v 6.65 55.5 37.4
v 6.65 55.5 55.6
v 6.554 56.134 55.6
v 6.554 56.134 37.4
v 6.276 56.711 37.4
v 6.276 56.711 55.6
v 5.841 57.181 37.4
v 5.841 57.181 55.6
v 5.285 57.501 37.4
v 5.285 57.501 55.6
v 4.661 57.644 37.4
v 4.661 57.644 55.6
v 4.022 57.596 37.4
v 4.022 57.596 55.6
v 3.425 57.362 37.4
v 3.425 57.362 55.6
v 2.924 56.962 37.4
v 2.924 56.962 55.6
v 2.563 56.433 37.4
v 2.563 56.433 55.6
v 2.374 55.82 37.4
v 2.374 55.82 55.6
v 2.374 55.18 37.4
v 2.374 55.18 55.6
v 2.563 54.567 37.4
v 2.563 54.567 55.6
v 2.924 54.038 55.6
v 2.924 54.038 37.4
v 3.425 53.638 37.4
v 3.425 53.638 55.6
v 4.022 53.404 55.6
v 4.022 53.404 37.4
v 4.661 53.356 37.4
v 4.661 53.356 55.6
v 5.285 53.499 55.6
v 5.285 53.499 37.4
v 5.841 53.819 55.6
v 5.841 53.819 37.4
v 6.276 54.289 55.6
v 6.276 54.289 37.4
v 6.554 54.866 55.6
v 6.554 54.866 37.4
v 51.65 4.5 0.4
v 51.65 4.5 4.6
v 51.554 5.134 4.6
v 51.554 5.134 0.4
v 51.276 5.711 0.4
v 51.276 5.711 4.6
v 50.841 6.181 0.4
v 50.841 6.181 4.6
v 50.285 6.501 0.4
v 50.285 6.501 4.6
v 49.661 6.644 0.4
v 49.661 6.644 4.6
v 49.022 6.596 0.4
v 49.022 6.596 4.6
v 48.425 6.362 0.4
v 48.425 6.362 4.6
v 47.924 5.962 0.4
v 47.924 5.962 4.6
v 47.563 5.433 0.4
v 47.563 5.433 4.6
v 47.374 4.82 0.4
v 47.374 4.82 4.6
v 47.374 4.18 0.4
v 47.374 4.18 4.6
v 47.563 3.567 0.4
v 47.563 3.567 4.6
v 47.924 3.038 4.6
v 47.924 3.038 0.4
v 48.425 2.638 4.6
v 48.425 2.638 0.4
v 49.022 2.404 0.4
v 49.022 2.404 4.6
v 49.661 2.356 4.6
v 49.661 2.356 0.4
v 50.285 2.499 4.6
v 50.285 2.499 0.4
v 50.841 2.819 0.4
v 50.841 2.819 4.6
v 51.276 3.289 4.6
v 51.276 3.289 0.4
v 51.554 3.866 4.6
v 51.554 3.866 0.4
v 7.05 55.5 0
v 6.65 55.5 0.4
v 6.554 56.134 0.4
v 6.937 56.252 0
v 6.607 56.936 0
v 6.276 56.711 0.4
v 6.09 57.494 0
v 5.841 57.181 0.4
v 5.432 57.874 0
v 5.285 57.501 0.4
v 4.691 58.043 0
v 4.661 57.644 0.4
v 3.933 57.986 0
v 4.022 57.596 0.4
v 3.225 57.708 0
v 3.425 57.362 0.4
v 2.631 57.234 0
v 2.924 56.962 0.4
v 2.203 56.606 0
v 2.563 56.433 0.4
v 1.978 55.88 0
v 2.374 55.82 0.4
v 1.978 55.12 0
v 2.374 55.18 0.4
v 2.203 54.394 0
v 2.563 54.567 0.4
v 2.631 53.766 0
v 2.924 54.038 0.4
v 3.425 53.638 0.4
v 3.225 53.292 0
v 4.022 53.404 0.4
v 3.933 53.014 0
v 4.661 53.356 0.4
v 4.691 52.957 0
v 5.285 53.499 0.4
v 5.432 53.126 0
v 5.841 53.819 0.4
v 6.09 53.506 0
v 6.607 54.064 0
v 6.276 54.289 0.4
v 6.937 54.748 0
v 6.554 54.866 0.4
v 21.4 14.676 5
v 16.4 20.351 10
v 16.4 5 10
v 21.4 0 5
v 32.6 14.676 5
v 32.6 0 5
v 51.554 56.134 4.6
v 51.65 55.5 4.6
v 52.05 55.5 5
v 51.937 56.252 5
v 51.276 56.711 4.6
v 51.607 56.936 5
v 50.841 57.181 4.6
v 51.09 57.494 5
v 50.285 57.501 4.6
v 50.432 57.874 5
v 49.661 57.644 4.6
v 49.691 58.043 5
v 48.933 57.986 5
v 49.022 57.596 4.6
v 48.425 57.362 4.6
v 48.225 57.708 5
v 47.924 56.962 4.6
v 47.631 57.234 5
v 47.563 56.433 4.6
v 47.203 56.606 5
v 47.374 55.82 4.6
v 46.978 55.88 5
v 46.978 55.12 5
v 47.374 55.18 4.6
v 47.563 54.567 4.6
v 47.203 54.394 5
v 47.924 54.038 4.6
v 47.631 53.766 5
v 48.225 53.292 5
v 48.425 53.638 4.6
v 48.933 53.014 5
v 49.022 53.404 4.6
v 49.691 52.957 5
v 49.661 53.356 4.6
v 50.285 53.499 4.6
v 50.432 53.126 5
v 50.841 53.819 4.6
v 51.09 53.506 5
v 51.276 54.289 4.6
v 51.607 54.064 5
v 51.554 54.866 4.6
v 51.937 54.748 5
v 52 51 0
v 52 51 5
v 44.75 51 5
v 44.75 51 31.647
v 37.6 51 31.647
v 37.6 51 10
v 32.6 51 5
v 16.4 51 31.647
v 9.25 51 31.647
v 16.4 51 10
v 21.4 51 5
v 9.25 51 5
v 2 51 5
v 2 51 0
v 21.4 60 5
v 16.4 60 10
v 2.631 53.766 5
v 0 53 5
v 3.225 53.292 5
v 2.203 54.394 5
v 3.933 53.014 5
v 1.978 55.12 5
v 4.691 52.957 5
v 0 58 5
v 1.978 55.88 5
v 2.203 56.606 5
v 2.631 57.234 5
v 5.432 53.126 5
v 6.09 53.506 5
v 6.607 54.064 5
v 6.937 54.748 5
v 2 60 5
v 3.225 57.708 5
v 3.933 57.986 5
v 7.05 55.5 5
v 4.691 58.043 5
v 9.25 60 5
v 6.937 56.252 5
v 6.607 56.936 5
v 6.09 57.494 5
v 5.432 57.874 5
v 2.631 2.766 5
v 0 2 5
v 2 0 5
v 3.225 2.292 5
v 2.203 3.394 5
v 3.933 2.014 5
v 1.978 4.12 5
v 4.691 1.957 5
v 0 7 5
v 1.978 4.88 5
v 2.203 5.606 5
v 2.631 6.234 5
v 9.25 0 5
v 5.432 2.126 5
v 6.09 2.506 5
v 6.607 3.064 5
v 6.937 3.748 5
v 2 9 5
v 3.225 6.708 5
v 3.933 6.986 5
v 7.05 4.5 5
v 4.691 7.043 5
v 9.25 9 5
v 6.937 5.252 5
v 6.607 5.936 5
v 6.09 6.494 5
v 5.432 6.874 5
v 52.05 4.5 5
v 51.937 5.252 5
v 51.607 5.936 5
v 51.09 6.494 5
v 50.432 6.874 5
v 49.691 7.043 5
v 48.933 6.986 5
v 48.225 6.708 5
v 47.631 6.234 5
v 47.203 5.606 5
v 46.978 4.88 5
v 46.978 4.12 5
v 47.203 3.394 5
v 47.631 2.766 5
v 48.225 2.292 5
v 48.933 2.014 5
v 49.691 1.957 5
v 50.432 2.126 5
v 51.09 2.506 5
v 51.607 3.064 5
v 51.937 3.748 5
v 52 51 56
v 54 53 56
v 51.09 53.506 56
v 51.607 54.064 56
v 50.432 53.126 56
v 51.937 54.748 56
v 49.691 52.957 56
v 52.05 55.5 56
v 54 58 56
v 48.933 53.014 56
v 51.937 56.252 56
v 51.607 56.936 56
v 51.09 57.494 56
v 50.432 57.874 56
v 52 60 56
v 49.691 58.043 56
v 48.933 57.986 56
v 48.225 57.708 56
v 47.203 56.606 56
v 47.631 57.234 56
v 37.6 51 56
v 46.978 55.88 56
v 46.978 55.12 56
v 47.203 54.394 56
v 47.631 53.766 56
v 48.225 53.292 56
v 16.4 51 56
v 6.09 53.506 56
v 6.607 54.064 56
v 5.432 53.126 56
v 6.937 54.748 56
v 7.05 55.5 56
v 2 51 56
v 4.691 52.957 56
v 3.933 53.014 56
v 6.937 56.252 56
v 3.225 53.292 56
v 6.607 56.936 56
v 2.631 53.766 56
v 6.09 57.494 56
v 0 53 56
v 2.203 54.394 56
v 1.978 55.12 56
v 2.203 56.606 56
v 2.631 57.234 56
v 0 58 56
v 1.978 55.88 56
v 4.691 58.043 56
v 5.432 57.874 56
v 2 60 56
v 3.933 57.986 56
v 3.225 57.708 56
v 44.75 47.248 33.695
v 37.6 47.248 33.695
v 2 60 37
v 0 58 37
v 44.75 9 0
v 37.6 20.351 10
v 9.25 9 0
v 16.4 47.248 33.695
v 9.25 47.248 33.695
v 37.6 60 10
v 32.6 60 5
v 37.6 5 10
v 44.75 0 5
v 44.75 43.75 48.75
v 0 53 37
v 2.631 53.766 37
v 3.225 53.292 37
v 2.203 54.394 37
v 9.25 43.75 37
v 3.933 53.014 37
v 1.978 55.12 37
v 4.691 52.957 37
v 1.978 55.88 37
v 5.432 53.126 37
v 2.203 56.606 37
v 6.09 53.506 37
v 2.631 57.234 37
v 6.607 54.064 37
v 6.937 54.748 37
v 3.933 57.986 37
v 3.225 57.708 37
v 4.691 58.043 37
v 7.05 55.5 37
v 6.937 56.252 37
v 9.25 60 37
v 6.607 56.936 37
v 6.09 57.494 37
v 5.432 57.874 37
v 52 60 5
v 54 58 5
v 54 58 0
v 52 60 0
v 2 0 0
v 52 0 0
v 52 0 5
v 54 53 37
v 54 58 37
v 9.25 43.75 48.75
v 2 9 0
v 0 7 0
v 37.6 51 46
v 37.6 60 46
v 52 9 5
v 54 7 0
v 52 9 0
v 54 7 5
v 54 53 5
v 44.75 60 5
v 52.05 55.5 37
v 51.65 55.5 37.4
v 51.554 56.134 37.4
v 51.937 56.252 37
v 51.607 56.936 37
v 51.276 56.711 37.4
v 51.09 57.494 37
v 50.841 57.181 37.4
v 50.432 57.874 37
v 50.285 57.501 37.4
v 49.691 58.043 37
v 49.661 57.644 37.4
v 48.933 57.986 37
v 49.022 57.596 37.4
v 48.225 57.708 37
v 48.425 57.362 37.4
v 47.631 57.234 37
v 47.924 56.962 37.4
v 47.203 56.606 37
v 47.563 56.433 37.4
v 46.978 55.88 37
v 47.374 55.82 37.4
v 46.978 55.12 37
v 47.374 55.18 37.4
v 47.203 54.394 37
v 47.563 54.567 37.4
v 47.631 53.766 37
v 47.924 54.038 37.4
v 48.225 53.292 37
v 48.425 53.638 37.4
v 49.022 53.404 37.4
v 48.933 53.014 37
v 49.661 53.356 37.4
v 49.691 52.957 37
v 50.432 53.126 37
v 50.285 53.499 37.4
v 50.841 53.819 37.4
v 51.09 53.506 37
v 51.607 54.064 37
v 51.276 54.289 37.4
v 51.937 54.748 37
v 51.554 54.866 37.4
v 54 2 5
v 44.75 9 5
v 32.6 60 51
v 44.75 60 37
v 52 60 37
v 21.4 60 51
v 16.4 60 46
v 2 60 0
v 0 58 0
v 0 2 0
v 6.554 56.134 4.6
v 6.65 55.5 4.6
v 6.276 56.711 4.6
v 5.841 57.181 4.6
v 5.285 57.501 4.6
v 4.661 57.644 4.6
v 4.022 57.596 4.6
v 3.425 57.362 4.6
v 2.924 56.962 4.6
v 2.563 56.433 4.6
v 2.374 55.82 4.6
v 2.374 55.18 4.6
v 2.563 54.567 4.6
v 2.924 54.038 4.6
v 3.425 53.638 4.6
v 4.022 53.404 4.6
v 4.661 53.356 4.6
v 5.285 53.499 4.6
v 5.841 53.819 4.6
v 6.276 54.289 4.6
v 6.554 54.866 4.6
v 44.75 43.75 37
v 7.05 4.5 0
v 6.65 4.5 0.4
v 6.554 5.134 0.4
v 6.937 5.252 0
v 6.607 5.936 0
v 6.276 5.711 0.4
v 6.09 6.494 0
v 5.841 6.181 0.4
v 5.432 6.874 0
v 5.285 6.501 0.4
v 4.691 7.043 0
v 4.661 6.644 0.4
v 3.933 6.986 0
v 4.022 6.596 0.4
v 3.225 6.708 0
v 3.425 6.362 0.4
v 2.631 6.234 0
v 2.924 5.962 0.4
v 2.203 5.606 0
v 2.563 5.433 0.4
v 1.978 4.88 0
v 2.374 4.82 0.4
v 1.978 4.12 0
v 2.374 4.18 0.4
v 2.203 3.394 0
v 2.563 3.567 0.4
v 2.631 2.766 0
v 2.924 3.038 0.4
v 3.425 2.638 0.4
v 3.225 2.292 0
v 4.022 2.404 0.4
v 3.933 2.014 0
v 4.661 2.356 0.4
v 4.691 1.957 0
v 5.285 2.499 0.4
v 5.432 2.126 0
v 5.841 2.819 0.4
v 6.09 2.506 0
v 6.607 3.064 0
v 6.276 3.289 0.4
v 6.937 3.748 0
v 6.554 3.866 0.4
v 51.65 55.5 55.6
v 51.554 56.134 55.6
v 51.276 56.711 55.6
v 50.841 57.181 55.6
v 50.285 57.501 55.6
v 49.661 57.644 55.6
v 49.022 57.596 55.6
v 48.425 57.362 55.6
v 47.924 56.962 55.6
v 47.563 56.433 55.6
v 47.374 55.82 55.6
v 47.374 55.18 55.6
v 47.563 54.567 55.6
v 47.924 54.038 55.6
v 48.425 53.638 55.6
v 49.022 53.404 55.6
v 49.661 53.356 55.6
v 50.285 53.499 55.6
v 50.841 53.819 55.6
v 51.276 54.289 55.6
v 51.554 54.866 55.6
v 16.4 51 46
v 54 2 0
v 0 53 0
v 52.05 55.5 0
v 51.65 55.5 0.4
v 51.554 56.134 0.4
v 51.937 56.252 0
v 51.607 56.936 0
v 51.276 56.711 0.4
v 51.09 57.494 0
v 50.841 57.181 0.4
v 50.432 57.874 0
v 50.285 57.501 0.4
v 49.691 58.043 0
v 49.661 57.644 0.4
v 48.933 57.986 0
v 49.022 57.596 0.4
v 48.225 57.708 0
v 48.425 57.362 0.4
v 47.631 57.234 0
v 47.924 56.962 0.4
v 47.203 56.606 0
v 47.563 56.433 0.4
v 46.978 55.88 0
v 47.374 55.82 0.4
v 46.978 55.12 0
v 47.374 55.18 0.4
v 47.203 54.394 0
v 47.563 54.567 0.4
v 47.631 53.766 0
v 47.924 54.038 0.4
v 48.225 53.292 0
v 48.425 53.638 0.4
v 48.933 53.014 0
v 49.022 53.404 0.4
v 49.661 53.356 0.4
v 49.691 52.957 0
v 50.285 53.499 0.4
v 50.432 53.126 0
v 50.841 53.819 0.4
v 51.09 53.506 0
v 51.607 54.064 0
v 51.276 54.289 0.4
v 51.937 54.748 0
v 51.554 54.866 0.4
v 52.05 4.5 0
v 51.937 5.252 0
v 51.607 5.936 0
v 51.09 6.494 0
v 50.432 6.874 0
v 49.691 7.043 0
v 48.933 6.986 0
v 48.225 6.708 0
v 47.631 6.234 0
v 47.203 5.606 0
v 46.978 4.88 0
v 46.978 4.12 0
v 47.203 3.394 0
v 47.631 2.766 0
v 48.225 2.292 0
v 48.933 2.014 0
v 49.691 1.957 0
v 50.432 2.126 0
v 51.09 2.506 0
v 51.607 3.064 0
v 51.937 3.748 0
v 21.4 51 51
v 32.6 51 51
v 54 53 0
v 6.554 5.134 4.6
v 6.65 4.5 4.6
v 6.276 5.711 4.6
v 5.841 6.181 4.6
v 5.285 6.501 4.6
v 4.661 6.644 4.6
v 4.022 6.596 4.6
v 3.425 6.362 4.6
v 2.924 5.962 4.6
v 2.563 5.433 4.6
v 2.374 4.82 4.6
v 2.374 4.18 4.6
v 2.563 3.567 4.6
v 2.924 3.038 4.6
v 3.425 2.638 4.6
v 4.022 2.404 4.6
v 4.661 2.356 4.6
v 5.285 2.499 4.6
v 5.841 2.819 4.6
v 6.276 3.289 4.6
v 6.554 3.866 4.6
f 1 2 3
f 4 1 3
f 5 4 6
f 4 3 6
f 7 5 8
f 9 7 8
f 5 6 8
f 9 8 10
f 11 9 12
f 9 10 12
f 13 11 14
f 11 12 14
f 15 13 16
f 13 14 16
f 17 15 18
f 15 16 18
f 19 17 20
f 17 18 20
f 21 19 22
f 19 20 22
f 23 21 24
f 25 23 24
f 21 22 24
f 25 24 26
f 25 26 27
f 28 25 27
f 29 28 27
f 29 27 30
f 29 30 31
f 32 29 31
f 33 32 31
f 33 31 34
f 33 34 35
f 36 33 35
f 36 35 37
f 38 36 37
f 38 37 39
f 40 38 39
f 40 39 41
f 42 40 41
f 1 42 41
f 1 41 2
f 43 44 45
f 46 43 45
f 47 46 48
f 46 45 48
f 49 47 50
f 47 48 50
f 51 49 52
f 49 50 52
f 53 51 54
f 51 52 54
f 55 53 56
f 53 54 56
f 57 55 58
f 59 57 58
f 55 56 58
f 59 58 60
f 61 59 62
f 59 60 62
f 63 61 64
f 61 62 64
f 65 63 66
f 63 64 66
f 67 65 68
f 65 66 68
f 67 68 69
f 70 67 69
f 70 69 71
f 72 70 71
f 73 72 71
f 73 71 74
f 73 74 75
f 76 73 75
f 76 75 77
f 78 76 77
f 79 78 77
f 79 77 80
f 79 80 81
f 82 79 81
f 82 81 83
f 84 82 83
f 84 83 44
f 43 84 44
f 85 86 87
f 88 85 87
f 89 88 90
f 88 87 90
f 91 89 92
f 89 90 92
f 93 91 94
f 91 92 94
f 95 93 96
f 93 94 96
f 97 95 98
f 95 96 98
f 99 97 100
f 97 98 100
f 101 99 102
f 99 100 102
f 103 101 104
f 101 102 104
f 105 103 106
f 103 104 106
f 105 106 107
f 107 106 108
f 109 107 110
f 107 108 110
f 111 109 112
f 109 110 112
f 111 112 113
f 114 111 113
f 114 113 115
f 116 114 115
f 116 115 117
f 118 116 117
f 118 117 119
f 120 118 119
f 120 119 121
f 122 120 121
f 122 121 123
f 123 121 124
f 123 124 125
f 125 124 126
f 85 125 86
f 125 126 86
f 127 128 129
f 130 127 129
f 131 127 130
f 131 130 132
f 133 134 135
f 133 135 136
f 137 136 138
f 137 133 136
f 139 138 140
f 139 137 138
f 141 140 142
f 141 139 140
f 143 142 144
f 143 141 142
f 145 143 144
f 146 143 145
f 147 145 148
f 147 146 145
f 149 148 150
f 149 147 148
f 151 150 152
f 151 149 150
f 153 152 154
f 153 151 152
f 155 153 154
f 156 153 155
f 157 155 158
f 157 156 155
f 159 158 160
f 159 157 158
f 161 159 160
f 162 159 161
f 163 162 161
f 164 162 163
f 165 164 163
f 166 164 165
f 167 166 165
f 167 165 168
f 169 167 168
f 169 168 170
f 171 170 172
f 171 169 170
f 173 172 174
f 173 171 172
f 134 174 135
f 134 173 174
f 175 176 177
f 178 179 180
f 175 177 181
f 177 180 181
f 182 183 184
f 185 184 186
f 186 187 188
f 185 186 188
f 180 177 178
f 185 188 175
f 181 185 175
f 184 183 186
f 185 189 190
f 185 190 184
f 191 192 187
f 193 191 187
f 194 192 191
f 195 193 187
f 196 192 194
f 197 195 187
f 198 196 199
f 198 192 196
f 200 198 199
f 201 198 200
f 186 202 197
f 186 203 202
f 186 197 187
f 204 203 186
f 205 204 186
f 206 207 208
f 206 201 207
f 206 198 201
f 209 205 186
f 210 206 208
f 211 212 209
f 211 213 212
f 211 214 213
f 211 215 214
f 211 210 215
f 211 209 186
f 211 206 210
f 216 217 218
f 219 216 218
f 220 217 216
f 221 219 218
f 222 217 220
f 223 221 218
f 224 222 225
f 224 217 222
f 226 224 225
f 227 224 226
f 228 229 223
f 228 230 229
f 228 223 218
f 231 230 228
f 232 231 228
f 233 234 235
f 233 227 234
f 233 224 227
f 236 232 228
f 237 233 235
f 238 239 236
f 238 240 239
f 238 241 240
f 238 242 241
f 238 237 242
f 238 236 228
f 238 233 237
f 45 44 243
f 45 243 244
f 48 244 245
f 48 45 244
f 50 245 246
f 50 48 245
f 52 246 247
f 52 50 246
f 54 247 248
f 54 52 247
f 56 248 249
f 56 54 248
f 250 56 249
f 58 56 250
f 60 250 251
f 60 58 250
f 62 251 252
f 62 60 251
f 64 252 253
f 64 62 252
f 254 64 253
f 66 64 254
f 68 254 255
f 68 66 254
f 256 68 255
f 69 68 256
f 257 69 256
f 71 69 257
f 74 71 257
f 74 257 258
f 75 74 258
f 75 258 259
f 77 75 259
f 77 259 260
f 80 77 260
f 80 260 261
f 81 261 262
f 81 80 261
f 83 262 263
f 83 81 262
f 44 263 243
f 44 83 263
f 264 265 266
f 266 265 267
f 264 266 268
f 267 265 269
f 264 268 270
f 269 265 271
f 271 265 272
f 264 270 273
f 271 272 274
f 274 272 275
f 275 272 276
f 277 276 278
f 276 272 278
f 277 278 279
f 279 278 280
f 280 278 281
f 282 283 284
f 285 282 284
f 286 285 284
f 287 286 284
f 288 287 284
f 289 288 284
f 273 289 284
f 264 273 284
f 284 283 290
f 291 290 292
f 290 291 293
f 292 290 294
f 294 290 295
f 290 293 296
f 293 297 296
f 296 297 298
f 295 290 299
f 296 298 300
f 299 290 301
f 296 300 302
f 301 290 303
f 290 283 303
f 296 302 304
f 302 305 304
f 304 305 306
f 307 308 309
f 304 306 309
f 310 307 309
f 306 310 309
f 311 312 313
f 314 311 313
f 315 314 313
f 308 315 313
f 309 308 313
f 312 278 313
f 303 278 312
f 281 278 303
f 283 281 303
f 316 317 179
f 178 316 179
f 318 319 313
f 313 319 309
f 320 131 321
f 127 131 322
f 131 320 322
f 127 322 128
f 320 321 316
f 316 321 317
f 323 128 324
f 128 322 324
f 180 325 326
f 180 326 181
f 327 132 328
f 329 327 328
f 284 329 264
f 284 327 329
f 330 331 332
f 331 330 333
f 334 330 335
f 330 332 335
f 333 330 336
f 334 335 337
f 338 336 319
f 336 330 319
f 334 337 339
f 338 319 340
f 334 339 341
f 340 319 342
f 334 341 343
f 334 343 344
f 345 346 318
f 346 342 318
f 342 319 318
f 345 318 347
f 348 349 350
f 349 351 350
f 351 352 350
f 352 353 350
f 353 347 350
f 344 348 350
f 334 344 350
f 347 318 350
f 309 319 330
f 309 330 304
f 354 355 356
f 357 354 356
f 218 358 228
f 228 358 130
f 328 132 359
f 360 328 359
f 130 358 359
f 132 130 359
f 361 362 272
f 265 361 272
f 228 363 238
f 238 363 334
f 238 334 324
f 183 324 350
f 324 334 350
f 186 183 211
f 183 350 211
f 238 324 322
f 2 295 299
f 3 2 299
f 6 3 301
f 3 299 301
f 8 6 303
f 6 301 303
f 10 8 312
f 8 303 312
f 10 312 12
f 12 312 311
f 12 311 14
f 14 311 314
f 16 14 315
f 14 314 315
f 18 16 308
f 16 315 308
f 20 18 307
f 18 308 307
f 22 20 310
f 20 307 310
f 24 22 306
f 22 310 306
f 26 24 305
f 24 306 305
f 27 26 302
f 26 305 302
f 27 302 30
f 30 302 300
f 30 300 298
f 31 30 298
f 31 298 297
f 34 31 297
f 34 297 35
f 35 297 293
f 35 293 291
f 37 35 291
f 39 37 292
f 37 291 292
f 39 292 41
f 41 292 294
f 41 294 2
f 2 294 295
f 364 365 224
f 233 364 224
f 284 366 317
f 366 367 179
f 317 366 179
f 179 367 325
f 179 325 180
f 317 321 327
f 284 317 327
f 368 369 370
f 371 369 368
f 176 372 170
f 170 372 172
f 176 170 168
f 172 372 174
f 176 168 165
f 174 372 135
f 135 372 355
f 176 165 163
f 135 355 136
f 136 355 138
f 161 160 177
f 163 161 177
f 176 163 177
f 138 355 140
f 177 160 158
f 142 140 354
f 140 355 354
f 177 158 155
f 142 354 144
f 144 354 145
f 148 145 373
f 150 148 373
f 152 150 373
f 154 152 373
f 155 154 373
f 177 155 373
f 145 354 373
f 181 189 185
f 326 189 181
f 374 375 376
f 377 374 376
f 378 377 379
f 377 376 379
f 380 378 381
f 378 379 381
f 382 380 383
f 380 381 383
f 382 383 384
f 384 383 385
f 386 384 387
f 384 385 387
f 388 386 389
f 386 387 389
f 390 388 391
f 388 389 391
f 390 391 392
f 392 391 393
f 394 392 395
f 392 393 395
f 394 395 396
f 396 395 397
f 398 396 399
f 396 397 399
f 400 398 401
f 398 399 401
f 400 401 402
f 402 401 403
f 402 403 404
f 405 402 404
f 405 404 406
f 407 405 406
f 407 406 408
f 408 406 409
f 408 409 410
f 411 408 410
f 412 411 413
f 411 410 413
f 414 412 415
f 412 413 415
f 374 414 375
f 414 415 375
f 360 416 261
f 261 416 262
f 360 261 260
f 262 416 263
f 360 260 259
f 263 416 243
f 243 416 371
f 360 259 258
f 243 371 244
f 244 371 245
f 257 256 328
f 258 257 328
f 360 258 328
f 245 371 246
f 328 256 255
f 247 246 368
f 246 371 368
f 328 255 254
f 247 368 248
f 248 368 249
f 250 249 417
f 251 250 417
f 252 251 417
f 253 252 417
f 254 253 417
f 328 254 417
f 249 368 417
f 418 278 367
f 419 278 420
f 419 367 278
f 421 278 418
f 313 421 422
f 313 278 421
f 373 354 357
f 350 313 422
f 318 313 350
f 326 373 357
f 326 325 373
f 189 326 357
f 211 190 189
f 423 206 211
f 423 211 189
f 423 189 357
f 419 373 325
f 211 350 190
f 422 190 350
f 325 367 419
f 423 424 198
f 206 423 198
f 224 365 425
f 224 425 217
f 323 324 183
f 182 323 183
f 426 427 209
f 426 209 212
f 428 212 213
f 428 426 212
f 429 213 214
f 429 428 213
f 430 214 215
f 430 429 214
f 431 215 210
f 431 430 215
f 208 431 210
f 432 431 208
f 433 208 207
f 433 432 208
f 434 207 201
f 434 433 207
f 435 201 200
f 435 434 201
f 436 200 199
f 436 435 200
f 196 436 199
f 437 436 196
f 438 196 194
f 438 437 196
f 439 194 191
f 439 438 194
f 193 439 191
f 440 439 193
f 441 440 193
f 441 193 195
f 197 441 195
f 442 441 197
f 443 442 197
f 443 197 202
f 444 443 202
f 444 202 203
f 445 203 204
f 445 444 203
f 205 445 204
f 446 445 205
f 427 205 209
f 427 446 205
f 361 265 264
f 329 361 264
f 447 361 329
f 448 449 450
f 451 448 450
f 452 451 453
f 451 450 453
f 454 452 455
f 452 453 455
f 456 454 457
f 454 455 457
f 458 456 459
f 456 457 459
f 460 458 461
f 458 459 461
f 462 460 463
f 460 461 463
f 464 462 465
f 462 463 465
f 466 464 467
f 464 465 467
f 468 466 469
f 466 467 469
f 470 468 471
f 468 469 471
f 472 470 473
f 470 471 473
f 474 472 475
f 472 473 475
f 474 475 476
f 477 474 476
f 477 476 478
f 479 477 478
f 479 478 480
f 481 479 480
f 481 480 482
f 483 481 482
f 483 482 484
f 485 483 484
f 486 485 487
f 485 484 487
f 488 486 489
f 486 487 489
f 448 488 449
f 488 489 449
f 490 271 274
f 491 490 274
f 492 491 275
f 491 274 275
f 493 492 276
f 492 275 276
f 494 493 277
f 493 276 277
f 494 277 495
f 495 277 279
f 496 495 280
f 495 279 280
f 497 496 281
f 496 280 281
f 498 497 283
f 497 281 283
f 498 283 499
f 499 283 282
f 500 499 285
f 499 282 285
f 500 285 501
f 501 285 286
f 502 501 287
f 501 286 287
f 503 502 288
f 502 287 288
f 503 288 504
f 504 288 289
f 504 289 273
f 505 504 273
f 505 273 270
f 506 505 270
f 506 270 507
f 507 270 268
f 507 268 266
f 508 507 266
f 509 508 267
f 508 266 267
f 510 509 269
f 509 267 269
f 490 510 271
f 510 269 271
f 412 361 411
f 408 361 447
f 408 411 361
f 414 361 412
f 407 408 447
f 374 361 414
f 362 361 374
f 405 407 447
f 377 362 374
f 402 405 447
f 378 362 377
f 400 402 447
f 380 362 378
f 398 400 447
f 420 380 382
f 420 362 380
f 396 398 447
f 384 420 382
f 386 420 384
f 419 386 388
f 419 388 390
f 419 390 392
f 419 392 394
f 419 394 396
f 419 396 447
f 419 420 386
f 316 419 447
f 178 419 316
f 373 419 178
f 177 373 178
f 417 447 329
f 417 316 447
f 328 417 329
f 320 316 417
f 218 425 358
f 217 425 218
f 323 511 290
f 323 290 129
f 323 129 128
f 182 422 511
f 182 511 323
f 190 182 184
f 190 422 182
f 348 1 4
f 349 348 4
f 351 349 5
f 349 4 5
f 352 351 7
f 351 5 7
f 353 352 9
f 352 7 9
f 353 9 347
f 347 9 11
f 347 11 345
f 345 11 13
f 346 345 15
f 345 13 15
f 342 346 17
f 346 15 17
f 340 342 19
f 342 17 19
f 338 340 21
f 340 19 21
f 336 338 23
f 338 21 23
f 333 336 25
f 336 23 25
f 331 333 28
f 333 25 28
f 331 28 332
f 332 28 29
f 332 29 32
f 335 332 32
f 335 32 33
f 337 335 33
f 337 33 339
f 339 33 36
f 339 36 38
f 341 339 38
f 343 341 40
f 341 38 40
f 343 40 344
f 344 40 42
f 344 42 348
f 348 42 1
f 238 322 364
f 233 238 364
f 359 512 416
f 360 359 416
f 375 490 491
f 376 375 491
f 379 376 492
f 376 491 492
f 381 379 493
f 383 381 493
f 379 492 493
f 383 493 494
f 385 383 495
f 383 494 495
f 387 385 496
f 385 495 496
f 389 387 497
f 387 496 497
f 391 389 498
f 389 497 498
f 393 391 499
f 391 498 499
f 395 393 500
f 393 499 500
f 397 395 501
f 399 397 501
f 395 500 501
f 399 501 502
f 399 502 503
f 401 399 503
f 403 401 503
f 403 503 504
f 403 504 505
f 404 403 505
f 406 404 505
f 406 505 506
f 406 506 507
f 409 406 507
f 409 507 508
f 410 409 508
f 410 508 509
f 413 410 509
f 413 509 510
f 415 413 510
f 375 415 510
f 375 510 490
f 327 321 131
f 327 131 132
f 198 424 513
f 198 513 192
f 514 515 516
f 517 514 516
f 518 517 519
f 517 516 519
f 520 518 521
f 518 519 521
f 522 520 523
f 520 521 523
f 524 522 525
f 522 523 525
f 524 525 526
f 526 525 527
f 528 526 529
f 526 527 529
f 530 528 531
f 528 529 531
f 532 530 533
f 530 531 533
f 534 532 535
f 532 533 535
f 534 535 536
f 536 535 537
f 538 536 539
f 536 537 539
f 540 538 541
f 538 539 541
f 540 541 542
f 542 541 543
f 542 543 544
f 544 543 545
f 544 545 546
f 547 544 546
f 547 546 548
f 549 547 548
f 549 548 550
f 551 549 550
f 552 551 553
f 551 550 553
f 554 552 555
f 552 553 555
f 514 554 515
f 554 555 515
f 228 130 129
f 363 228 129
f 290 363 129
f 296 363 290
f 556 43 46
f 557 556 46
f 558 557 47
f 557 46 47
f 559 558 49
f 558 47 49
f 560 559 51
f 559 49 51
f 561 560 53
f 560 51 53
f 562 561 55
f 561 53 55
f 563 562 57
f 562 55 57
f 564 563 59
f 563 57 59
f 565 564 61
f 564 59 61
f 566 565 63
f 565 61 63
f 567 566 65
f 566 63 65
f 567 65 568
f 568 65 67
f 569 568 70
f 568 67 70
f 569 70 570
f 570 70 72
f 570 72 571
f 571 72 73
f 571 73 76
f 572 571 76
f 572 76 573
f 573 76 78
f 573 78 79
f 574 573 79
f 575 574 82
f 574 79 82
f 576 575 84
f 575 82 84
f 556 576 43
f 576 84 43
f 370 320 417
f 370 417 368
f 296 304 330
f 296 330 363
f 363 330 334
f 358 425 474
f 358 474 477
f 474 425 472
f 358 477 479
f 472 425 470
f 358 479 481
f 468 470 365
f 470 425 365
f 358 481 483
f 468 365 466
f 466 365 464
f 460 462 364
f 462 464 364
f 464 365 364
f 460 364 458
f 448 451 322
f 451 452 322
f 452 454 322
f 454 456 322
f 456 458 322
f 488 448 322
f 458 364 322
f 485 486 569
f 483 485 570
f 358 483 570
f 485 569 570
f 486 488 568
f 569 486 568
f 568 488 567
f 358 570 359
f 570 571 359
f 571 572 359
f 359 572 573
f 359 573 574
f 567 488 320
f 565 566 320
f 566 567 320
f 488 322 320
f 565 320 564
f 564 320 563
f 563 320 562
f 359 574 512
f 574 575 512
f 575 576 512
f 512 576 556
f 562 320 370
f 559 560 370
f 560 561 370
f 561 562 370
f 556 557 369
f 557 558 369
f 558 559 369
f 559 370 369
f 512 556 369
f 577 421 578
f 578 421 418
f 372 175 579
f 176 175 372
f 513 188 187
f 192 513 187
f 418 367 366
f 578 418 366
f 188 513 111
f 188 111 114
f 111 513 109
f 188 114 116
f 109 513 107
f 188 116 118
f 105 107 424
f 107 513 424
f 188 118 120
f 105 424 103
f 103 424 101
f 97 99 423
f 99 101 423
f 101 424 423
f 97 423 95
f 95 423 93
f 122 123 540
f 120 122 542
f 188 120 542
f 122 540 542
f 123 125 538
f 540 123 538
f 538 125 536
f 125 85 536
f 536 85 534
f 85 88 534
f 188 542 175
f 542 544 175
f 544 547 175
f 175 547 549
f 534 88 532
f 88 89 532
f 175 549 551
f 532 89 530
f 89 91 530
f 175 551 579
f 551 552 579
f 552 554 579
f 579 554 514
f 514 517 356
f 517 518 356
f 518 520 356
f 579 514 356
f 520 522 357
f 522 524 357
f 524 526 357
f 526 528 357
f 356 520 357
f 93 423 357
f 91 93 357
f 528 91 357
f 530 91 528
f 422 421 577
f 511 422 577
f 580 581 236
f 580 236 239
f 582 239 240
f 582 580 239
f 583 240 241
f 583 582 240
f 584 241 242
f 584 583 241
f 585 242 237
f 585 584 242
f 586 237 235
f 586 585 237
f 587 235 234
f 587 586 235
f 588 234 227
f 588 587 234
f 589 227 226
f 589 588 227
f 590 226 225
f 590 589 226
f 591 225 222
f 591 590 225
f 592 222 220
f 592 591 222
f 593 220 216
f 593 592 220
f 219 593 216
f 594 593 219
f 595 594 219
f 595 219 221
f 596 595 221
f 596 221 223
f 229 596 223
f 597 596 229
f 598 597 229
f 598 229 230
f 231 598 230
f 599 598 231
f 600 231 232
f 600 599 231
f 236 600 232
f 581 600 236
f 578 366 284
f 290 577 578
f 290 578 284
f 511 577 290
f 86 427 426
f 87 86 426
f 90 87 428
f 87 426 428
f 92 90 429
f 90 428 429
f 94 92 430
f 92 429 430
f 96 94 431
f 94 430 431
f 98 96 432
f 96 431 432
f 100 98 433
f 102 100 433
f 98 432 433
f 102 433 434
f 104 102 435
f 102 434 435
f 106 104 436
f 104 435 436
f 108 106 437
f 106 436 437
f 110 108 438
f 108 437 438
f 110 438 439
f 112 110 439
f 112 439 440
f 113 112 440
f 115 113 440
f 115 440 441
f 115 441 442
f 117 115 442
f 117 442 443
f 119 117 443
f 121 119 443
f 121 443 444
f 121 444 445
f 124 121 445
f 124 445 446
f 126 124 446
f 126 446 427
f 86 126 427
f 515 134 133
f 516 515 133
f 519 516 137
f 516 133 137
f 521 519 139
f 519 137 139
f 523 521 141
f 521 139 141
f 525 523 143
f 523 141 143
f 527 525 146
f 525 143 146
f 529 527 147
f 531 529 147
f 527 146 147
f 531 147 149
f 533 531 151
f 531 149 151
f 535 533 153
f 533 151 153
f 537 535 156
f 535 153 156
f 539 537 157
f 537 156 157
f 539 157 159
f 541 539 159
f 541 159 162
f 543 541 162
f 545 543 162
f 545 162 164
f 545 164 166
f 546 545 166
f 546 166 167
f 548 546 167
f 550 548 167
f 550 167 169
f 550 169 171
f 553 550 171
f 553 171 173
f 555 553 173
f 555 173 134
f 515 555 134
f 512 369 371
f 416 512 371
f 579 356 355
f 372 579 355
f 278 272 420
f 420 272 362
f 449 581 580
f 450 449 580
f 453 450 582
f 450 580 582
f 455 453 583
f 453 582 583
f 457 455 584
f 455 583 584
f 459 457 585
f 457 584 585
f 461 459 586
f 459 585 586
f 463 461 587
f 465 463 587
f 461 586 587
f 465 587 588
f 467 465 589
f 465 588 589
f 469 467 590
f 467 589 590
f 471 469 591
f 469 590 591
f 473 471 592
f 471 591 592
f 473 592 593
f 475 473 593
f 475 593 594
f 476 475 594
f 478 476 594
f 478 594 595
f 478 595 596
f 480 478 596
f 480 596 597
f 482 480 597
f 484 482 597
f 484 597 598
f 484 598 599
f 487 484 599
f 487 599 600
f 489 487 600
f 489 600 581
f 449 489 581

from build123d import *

# Parameters (mm, degrees)
SKETCH1_W               = 54
SKETCH1_H               = 60
BOSS_EXTRUDE1_DEPTH     = 5
BOSS_EXTRUDE2_DEPTH     = 54
SKETCH6_W               = 9.25
SKETCH6_H               = 32
CUT_EXTRUDE1_DEPTH      = 99.244592727
SKETCH8_W               = 9.25
SKETCH8_H               = 42
CUT_EXTRUDE3_DEPTH      = 99.244592727
M4_CLEARANCE_HOLE2_D    = 4.3
CUT_EXTRUDE4_DEPTH      = 94.480278669
SKETCH12_W              = 21.2
SKETCH12_H              = 46
CUT_EXTRUDE5_DEPTH      = 99.244592727
CHAMFER1_SIZE           = 2
CHAMFER2_SIZE           = 5
CHAMFER2_SIZE_2         = 5.352523158
SKETCH13_W              = 21.2
SKETCH13_H              = 5
CUT_EXTRUDE6_DEPTH      = 99.244592727
CHAMFER3_SIZE           = 5
BOSS_EXTRUDE3_DEPTH     = 19
CUT_EXTRUDE7_DEPTH      = 94.480278669
CUT_EXTRUDE7_DEPTH_BACK = 94.480278669
CHAMFER4_SIZE           = 0.4
CHAMFER5_SIZE           = 0.4


with BuildPart() as part:
    # Sketch1 → Boss-Extrude1 (new body)
    with BuildSketch(Plane.XY):
        with Locations((27, 30)):
            Rectangle(SKETCH1_W, SKETCH1_H)
    extrude(amount=BOSS_EXTRUDE1_DEPTH)

    # Sketch5 → Boss-Extrude2 (add)
    with BuildSketch(Plane.ZY):
        Polygon((56, 60), (5, 60), (5, 0), (56, 51), align=None)
    extrude(amount=-BOSS_EXTRUDE2_DEPTH)

    # Sketch6 → Cut-Extrude1 (cut, through all)
    with BuildSketch(Plane(origin=(0, 60, 0), x_dir=(1, 0, 0), z_dir=(0, 1, 0))):
        with Locations((4.625, -21)):
            Rectangle(SKETCH6_W, SKETCH6_H)
    cut_extrude1 = extrude(amount=-CUT_EXTRUDE1_DEPTH, mode=Mode.SUBTRACT)

    # Sketch8 → Cut-Extrude3 (cut, through all)
    with BuildSketch(Plane(origin=(0, 0, 0), x_dir=(-1, 0, 0), z_dir=(0, 0, -1))):
        with Locations((-4.625, 30)):
            Rectangle(SKETCH8_W, SKETCH8_H)
    cut_extrude3 = extrude(amount=-CUT_EXTRUDE3_DEPTH, mode=Mode.SUBTRACT)

    # Mirror1: Cut-Extrude1, Cut-Extrude3 across plane
    add(cut_extrude1.mirror(Plane(origin=(27, 0, 0), x_dir=(0, 0, 1), z_dir=(1, 0, 0))), mode=Mode.SUBTRACT)
    add(cut_extrude3.mirror(Plane(origin=(27, 0, 0), x_dir=(0, 0, 1), z_dir=(1, 0, 0))), mode=Mode.SUBTRACT)

    # M4 Clearance Hole2 (through all)
    with Locations(Plane(origin=(0, 0, 0), x_dir=(-1, 0, 0), z_dir=(0, 0, -1))):
        with Locations((-4.5, 55.5), (-49.5, 55.5), (-49.5, 4.5), (-4.5, 4.5)):
            Hole(M4_CLEARANCE_HOLE2_D / 2)

    # Sketch11 → Cut-Extrude4 (cut, through all)
    with BuildSketch(Plane.ZY.offset(-9.25)):
        Polygon((0, 9), (37, 51), (0, 51), align=None)
    extrude(amount=-CUT_EXTRUDE4_DEPTH, mode=Mode.SUBTRACT)

    # Sketch12 → Cut-Extrude5 (cut, through all)
    with BuildSketch(Plane(origin=(0, 60, 0), x_dir=(1, 0, 0), z_dir=(0, 1, 0))):
        with Locations((27, -28)):
            Rectangle(SKETCH12_W, SKETCH12_H)
    extrude(amount=-CUT_EXTRUDE5_DEPTH, mode=Mode.SUBTRACT)

    # Chamfer1
    chamfer1_edges = [part.edges().sort_by_distance(p)[0] for p in [
        (0, 60, 2.5),
        (0, 9, 2.5),
        (0, 51, 2.5),
        (0, 51, 46.5),
        (54, 60, 2.5),
        (0, 60, 46.5),
        (54, 60, 46.5),
        (54, 0, 2.5),
        (0, 0, 2.5),
        (54, 51, 46.5),
        (54, 9, 2.5),
        (54, 51, 2.5),
    ]]
    chamfer(chamfer1_edges, length=CHAMFER1_SIZE)

    # Chamfer2
    # the kernel refuses this chamfer: 5.352523158, 5 mm, written as the material it adds along each edge
    with BuildSketch(Plane(origin=(37.6, 51, 37), x_dir=(0, -0.7759635654606418, -0.6307777303278932), z_dir=(1, 0, 0)), Plane(origin=(9.25, 51, 37), x_dir=(0, -0.7759635654606418, -0.6307777303278932), z_dir=(1, 0, 0))) as chamfer2_piece_1:
        Polygon((CHAMFER2_SIZE * 0.999214586642, CHAMFER2_SIZE * 0.039625873385), (CHAMFER2_SIZE_2 * 0.630777730356, CHAMFER2_SIZE_2 * 0.775963565495), (0, 0), align=None)
    extrude(amount=7.15)

    # Sketch13 → Cut-Extrude6 (cut, through all)
    with BuildSketch(Plane(origin=(0, 0, 0), x_dir=(-1, 0, 0), z_dir=(0, 0, -1))):
        with Locations((-27, 48.5)):
            Rectangle(SKETCH13_W, SKETCH13_H)
    extrude(amount=-CUT_EXTRUDE6_DEPTH, mode=Mode.SUBTRACT)

    # Chamfer3
    chamfer3_edges = [part.edges().sort_by_distance(p)[0] for p in [
        (16.4, 55.5, 5),
        (16.4, 7.337837838, 5),
        (37.6, 7.337837838, 5),
        (37.6, 55.5, 5),
        (16.4, 55.5, 51),
        (37.6, 55.5, 51),
    ]]
    chamfer(chamfer3_edges, length=CHAMFER3_SIZE)

    # Sketch14 → Boss-Extrude3 (add)
    with BuildSketch(Plane(origin=(0, 0, 37), x_dir=(-1, 0, 0), z_dir=(0, 0, -1))):
        Polygon((-2, 51), (-9.25, 43.75), (-9.25, 51), align=None)
    boss_extrude3 = extrude(amount=-BOSS_EXTRUDE3_DEPTH)

    # Mirror3: Boss-Extrude3 across plane
    add(boss_extrude3.mirror(Plane(origin=(27, 0, 0), x_dir=(0, 0, 1), z_dir=(1, 0, 0))))

    # Sketch15 → Cut-Extrude7 (cut, two sides: drawn at the far end of the back side and taken through both)
    with BuildSketch(Plane(origin=(9.25, 0, 0), x_dir=(0, 0, -1), z_dir=(1, 0, 0)).offset(-CUT_EXTRUDE7_DEPTH_BACK)):
        Polygon((-48.75, 43.75), (-56, 51), (-56, 43.75), align=None)
    extrude(amount=CUT_EXTRUDE7_DEPTH + CUT_EXTRUDE7_DEPTH_BACK, mode=Mode.SUBTRACT)

    # Chamfer4
    chamfer4_edges = [part.edges().sort_by_distance(p)[0] for p in [
        (47.35, 55.5, 37),
        (47.35, 55.5, 56),
        (2.35, 55.5, 56),
        (2.35, 55.5, 37),
    ]]
    chamfer(chamfer4_edges, length=CHAMFER4_SIZE)

    # Chamfer5
    chamfer5_edges = [part.edges().sort_by_distance(p)[0] for p in [
        (2.35, 4.5, 5),
        (2.35, 4.5, 0),
        (47.35, 4.5, 5),
        (47.35, 4.5, 0),
        (47.35, 55.5, 5),
        (47.35, 55.5, 0),
        (2.35, 55.5, 5),
        (2.35, 55.5, 0),
    ]]
    chamfer(chamfer5_edges, length=CHAMFER5_SIZE)


solid = part.part
